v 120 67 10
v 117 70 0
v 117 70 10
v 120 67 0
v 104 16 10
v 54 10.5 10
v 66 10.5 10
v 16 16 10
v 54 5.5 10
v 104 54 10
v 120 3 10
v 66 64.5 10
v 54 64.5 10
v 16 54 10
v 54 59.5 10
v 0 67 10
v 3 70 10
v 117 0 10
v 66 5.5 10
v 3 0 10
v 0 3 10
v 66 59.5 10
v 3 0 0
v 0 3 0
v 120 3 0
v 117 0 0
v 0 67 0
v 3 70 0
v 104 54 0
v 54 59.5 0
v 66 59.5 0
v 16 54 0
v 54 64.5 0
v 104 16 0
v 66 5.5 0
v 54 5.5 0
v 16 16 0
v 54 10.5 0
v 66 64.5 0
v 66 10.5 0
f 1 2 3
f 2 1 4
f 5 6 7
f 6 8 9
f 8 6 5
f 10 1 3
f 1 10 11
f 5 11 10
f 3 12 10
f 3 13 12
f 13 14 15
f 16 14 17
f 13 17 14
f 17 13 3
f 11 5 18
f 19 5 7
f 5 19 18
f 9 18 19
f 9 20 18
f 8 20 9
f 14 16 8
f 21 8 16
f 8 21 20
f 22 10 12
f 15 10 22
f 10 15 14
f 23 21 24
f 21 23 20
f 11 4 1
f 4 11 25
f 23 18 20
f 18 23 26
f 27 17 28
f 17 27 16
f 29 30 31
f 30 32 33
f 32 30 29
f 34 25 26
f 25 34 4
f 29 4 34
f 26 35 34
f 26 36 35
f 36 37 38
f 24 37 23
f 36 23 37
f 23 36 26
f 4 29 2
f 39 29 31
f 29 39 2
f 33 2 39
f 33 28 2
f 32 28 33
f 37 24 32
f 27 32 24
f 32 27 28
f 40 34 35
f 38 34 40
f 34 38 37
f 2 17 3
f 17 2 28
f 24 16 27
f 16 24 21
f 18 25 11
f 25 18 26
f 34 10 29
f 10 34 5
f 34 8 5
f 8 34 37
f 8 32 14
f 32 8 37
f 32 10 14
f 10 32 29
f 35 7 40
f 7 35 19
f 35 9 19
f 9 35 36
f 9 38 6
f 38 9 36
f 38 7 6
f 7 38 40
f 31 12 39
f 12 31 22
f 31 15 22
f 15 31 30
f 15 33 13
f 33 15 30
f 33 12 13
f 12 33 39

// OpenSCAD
$fn = 32;

// ----------------------------------------------------------------------
// Frame plate: 120 x 70 frame, 16 mm rails
// ----------------------------------------------------------------------

// --- parameters (mm) ---
plate_l = 120;            // plate length, X
plate_w = 70;             // plate width, Y
plate_t = 10;             // plate thickness, Z (extrusion height)
corner_c = 3;             // corner chamfer
frame_bar = 16;           // frame rail width
slot_l = 12;              // adjustment slot length
slot_w = 5;               // adjustment slot width

win_l = plate_l - 2 * frame_bar;  // window length
win_w = plate_w - 2 * frame_bar;  // window width

profile = [[3, 0], [117, 0], [120, 3], [120, 67], [117, 70], [3, 70], [0, 67], [0, 3]];  // primary outline, 8 points, counter clockwise
void_1 = [[16, 16], [104, 16], [104, 54], [16, 54]];  // the window, 4 points
void_2 = [[54, 5.5], [66, 5.5], [66, 10.5], [54, 10.5]];  // adjustment slot, 4 points
void_3 = [[54, 59.5], [66, 59.5], [66, 64.5], [54, 64.5]];  // adjustment slot, 4 points

// --- the one profile operation ---
difference() {
  linear_extrude(height = plate_t) polygon(points = profile);
  translate([0, 0, -1])
    linear_extrude(height = plate_t + 2) polygon(points = void_1);
  translate([0, 0, -1])
    linear_extrude(height = plate_t + 2) polygon(points = void_2);
  translate([0, 0, -1])
    linear_extrude(height = plate_t + 2) polygon(points = void_3);
}
